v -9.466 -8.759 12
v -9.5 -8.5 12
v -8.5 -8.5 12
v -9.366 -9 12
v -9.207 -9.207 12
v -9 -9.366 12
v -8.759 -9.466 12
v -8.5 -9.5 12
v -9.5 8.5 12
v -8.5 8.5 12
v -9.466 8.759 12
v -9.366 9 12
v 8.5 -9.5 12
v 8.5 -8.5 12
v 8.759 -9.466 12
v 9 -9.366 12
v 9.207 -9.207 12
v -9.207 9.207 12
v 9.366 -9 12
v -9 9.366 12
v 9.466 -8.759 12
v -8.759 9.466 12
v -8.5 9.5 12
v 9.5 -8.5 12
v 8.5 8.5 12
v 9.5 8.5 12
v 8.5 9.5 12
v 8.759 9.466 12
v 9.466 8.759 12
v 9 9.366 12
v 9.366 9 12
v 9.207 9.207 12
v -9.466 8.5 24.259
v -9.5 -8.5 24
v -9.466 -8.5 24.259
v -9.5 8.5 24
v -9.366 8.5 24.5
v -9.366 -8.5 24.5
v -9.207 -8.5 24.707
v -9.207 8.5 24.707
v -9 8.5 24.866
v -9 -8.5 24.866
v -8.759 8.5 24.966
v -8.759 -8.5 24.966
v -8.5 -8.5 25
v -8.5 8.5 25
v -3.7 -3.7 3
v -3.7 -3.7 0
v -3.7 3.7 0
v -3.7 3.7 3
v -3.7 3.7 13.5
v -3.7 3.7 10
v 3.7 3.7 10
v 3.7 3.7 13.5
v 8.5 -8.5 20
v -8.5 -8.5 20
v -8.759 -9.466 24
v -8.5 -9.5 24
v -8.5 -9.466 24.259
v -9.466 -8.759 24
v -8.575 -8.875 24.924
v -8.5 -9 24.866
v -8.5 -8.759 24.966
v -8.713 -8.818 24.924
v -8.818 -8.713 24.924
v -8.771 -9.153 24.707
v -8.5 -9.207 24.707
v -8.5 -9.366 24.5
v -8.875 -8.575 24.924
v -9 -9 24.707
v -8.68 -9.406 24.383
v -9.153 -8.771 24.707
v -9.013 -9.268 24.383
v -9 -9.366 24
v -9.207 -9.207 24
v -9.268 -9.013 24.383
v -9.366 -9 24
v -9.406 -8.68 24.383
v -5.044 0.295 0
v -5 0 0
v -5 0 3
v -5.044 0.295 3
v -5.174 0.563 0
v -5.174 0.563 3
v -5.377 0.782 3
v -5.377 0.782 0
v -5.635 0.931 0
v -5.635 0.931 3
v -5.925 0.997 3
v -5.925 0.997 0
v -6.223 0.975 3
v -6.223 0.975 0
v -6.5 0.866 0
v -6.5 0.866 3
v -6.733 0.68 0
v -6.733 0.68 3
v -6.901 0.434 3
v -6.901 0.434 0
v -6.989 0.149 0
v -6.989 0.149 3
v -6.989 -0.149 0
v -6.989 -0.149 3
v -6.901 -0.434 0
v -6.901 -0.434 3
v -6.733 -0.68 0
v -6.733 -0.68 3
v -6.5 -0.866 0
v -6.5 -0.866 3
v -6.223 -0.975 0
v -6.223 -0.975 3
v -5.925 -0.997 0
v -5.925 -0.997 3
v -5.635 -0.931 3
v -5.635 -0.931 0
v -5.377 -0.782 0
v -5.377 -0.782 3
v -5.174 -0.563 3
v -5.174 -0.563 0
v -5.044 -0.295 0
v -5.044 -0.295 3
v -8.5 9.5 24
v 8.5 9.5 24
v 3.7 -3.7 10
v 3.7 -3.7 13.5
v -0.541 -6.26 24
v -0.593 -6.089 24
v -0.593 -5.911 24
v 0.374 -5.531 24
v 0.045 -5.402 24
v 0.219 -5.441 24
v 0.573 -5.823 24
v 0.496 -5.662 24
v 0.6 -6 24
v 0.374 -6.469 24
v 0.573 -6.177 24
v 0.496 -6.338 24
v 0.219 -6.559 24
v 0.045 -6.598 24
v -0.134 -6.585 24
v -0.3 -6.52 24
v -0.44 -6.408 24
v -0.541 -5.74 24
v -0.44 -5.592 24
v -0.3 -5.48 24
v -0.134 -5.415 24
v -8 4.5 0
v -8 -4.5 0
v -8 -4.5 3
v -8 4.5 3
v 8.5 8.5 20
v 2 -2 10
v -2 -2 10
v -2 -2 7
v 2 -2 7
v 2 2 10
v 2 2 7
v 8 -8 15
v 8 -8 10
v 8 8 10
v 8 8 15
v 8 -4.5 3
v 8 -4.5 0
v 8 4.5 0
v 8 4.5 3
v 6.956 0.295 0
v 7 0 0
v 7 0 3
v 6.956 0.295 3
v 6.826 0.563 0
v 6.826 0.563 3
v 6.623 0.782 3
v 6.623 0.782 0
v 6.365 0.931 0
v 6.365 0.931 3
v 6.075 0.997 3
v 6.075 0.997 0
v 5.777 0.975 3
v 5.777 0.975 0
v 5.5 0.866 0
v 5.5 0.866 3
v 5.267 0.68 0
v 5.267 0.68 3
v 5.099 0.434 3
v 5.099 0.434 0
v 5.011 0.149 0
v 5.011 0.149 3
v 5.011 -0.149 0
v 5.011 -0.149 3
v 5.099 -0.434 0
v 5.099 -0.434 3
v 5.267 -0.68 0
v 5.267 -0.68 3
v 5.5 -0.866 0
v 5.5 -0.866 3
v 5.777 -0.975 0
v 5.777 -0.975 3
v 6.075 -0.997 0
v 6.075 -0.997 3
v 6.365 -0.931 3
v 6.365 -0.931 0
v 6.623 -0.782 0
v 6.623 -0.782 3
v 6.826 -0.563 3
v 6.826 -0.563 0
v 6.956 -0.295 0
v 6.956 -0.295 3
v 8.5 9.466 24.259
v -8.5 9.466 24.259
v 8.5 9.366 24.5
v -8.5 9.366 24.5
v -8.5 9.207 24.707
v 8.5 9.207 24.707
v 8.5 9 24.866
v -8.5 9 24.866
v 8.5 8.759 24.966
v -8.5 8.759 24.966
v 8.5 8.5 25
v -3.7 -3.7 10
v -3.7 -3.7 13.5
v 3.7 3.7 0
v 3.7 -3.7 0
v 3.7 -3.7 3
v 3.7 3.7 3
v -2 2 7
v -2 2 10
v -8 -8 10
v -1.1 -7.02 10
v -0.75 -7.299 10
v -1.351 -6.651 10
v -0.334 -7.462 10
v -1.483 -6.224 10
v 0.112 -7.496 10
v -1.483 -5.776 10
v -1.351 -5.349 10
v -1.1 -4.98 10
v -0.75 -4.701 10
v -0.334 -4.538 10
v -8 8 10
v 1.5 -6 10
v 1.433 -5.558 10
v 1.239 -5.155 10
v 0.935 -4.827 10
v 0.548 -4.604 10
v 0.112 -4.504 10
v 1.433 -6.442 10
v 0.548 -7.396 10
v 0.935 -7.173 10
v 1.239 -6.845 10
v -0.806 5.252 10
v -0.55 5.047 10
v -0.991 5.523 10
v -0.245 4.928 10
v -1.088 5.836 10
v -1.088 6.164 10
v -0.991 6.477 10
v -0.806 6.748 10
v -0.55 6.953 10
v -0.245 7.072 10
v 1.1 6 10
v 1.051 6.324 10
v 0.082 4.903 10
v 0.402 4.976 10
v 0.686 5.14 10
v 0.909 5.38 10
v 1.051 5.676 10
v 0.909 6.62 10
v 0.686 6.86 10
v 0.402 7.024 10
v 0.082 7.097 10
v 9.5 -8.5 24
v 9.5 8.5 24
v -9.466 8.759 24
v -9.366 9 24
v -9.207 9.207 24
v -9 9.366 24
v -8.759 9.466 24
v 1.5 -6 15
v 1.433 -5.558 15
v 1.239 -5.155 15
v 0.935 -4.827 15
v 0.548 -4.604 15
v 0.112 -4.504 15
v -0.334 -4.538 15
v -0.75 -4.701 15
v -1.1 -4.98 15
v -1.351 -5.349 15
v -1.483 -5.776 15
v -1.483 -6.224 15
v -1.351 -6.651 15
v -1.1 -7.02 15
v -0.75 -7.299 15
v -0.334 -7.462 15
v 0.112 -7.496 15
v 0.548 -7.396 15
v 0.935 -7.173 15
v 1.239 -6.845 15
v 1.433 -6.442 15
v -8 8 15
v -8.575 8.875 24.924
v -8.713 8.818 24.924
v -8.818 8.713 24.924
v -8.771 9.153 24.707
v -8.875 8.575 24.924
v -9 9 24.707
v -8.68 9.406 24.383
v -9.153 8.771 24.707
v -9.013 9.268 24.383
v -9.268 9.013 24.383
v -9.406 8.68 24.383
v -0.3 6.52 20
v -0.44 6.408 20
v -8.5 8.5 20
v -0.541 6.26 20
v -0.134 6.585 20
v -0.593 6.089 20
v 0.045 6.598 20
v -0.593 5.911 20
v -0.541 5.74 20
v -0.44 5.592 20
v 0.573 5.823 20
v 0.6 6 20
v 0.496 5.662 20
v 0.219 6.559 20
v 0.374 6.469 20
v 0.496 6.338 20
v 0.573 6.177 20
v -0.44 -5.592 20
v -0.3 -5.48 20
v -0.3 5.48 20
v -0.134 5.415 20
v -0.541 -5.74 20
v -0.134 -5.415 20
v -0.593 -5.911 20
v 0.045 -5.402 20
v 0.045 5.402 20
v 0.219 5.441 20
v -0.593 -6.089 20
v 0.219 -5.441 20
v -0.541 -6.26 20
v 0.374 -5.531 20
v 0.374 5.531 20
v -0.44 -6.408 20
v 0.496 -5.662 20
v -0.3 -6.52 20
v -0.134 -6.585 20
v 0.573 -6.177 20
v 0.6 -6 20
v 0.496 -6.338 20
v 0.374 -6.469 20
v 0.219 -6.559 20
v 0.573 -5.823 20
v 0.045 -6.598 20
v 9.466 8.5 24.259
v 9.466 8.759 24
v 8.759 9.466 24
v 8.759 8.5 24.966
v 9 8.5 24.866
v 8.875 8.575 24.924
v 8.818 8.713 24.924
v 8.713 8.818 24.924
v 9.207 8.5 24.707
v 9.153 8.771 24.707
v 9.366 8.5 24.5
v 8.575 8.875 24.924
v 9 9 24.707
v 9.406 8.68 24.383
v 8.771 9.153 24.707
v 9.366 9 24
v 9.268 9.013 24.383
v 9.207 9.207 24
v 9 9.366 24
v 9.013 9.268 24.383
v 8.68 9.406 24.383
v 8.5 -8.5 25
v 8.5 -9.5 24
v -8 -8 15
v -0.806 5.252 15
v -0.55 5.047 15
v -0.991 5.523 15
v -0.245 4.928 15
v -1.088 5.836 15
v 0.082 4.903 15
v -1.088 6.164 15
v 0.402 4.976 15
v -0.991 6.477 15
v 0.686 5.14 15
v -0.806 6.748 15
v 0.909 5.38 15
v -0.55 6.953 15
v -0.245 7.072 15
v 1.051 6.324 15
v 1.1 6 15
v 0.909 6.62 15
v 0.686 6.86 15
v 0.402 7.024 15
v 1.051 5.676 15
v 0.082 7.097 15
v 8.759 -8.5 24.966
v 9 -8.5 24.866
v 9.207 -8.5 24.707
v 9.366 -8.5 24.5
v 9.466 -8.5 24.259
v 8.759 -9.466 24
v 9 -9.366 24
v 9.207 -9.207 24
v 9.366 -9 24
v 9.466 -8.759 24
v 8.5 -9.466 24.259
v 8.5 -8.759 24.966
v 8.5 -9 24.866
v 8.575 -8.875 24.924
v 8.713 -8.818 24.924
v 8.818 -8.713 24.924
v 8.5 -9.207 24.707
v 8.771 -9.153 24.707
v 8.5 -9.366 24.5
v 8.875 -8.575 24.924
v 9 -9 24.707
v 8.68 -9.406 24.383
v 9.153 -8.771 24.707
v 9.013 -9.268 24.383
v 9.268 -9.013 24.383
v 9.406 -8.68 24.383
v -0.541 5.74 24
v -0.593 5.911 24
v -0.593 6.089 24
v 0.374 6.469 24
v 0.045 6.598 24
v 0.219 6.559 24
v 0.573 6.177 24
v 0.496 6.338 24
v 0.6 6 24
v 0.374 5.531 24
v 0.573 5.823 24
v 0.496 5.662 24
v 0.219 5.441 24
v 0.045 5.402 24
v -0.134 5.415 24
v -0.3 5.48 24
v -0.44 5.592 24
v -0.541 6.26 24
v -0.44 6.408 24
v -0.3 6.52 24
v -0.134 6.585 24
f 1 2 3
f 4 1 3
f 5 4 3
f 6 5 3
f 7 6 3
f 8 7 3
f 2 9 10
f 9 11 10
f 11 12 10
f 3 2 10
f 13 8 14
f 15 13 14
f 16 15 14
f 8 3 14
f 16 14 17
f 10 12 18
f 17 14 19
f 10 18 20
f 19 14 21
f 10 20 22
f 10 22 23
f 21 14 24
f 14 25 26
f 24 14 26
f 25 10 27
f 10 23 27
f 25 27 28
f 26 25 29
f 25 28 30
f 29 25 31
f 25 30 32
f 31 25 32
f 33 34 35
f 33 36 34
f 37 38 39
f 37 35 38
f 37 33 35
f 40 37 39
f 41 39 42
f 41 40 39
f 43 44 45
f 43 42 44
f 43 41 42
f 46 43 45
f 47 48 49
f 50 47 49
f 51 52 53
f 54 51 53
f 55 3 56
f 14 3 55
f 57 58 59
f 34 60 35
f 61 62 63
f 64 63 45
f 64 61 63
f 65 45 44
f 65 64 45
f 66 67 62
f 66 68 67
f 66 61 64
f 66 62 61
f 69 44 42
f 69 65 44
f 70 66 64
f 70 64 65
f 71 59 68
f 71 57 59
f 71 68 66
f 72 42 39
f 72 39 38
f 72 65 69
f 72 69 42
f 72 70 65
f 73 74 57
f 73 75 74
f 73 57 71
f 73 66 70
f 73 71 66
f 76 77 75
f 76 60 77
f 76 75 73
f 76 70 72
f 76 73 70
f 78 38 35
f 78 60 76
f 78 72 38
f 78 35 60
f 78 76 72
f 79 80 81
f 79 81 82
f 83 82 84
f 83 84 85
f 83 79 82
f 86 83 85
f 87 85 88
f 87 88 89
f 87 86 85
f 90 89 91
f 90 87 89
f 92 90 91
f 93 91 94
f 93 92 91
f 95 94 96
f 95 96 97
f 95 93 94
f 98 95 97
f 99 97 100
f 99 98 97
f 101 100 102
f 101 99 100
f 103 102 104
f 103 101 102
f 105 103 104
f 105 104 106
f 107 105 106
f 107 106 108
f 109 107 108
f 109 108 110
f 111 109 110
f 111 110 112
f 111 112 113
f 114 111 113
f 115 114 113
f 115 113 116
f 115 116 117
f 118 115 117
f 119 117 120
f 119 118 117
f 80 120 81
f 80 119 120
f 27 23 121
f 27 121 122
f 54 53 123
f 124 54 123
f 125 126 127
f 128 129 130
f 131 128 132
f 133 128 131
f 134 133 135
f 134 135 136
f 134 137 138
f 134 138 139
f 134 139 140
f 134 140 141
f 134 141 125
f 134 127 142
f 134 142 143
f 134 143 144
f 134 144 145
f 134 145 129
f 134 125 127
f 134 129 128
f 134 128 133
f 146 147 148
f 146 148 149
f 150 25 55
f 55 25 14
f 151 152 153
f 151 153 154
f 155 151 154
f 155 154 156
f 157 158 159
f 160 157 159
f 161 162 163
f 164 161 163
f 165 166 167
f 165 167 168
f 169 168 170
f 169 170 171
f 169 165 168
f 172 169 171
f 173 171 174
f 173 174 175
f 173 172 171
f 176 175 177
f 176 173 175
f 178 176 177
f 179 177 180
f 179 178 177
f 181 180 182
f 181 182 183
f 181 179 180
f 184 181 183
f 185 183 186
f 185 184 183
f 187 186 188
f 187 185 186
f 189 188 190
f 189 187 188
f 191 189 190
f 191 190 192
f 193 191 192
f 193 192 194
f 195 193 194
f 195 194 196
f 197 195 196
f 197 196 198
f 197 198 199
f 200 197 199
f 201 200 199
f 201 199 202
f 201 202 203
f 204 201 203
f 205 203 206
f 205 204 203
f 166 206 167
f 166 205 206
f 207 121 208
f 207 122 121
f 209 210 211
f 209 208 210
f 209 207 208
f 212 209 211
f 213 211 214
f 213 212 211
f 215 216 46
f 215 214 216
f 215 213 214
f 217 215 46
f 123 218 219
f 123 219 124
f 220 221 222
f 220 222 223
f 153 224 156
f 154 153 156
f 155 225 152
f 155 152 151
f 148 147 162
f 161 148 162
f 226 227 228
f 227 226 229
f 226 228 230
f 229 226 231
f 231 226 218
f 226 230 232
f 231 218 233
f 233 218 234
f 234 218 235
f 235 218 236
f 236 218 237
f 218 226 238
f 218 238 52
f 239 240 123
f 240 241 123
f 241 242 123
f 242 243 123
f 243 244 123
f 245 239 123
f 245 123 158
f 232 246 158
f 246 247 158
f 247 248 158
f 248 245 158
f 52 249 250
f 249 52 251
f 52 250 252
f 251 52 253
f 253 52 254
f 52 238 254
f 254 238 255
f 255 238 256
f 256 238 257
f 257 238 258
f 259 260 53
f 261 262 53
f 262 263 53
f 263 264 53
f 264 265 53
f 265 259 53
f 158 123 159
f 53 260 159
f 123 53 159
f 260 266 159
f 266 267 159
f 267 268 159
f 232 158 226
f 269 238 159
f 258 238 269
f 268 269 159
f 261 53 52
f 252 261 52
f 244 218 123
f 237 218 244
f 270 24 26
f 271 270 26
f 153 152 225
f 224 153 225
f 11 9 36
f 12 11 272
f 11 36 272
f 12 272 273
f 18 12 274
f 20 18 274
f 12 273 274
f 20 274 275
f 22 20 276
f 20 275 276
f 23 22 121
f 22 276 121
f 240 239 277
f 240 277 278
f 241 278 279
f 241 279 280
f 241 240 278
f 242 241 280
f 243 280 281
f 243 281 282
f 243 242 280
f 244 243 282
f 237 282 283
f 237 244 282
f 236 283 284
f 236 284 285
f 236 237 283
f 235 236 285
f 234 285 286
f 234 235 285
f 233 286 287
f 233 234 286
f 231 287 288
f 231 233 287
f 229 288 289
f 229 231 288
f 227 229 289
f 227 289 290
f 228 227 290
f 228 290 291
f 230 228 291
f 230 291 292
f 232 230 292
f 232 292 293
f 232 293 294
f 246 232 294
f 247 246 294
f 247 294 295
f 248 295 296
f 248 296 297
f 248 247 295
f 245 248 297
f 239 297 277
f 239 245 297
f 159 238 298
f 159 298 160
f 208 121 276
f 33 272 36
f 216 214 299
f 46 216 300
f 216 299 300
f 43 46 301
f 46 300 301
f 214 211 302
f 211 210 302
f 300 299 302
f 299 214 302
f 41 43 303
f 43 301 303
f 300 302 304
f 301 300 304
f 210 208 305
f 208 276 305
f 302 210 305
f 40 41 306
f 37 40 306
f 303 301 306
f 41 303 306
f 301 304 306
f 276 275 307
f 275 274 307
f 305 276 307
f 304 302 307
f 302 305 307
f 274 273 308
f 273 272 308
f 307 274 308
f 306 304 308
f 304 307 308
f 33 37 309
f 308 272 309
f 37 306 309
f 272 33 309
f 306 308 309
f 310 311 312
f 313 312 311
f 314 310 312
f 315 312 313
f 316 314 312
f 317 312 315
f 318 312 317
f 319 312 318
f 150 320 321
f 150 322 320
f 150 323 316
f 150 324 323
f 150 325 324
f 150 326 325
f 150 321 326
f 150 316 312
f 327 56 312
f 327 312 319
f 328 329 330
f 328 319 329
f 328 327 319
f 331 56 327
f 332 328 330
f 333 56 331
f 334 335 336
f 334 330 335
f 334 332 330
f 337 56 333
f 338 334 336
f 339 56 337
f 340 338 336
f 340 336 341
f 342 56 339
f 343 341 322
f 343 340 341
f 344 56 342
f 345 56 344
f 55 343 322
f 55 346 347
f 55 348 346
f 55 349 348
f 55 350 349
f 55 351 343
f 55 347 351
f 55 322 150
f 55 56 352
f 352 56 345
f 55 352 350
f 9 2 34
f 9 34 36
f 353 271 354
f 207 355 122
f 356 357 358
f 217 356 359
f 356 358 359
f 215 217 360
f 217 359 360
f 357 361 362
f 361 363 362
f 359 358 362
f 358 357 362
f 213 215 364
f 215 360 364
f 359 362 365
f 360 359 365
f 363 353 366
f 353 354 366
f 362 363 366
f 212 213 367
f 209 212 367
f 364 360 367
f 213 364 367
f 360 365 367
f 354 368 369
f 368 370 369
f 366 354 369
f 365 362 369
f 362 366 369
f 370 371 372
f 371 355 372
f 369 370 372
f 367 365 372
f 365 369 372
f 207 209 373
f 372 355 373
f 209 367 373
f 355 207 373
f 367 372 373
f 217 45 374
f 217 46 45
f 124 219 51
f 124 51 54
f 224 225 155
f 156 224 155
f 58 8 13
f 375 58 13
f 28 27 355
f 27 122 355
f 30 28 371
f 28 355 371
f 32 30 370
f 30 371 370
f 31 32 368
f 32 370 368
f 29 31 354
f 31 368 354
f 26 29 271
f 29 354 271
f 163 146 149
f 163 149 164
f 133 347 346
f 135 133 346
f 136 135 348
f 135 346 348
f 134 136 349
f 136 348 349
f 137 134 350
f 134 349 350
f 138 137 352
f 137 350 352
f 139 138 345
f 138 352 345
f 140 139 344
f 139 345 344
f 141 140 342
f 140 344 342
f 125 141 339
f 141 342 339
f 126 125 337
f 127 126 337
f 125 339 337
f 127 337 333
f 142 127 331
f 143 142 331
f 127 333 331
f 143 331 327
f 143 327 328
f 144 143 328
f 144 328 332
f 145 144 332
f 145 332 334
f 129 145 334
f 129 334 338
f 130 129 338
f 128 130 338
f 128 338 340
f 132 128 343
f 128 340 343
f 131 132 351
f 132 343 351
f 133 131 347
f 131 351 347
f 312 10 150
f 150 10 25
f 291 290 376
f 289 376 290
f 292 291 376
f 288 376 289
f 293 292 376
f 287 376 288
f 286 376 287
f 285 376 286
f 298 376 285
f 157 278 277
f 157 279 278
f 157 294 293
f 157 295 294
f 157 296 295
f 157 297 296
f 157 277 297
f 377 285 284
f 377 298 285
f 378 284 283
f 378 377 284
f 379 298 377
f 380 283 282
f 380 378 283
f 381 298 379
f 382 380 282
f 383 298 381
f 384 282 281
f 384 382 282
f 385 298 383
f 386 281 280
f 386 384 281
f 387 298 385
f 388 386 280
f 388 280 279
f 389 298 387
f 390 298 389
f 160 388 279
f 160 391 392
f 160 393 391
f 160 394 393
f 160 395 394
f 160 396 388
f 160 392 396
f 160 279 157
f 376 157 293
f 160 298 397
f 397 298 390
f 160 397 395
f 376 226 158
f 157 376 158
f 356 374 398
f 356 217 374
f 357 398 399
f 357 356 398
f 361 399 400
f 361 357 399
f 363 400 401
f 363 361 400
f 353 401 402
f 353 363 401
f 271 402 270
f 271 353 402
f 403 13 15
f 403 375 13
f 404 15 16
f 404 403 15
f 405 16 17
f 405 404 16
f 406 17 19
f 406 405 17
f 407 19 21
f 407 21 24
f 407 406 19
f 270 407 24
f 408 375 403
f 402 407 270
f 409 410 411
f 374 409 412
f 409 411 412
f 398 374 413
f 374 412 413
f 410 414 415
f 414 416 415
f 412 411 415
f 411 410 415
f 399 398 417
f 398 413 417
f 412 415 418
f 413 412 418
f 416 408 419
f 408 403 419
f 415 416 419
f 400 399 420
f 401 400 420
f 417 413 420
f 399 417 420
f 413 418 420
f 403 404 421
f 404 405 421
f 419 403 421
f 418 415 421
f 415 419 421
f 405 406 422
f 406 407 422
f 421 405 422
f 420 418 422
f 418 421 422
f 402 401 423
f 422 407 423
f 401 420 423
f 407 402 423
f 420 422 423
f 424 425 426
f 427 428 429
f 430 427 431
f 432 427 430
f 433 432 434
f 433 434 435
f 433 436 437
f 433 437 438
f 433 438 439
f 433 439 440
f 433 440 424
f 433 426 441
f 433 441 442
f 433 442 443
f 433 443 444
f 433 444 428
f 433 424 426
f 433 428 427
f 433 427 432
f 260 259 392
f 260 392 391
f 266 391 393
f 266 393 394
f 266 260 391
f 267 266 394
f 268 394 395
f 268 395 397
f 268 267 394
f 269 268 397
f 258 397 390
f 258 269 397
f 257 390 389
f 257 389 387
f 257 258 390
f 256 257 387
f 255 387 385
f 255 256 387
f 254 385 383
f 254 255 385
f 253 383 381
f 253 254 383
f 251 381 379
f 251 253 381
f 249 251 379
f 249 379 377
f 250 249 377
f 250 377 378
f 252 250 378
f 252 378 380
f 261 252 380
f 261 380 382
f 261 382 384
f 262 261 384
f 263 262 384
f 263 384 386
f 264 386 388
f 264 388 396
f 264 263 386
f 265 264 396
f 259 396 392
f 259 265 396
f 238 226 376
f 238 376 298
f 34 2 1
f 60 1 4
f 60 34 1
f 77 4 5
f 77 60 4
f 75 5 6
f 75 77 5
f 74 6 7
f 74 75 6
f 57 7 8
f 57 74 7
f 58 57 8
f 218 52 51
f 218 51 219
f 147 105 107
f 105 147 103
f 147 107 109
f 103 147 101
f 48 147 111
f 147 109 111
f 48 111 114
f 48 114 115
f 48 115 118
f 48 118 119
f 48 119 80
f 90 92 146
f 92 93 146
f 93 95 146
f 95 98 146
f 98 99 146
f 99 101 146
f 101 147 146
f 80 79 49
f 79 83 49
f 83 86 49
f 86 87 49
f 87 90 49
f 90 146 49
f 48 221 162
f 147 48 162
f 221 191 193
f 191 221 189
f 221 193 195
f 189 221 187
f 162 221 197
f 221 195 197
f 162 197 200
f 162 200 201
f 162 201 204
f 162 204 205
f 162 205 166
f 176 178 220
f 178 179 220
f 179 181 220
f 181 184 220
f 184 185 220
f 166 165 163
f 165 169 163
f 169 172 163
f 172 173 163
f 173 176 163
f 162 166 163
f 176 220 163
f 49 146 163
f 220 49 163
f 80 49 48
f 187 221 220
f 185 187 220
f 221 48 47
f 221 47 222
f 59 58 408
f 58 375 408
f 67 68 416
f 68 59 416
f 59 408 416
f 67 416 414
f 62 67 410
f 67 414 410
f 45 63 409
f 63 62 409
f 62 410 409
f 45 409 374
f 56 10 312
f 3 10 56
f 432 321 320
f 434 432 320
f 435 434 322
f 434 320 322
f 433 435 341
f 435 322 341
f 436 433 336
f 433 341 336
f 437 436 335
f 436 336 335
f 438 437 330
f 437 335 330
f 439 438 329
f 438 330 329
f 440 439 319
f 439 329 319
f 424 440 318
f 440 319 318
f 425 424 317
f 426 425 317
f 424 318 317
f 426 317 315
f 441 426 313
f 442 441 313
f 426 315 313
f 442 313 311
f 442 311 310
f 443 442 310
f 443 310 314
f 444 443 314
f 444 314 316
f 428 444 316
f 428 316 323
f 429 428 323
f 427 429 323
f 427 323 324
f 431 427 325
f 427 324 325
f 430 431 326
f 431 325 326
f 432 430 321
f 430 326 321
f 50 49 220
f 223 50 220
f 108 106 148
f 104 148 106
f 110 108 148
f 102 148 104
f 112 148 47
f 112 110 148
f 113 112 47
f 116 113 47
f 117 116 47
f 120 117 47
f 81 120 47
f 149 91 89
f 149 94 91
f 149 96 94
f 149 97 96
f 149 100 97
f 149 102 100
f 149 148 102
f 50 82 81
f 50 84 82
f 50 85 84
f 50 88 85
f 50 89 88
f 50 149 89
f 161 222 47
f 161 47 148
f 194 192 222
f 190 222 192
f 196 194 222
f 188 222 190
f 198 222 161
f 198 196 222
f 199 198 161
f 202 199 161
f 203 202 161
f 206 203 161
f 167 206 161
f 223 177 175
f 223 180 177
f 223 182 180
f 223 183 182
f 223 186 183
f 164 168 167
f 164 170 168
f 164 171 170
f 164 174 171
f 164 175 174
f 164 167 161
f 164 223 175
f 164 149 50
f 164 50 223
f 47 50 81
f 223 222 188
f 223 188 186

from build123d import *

# Parameters (mm, degrees)
F0_W      = 16
F0_H      = 9
F0_R      = 1
F0_W_2    = 7.4
F0_H_2    = 7.4
F1_DEPTH  = 3
F3_W      = 4
F3_H      = 4
F4_DEPTH  = 3
F5_W      = 16
F5_H      = 16
F5_R      = 1.5
F5_R_2    = 1.1
F6_DEPTH  = 5
F8_W      = 19
F8_H      = 19
F9_DEPTH  = 13
F10_W     = 17
F10_H     = 17
F11_DEPTH = 8
F12_R     = 0.6
F13_DEPTH = 4
F14_R     = 1
F15_W     = 7.4
F15_H     = 7.4
F16_DEPTH = 3.5


with BuildPart() as f1:
    # F0 (on Top) → F1 (new body)
    with BuildSketch(Plane.XY):
        Rectangle(F0_W, F0_H)
        with Locations((-6, 0)):
            Circle(F0_R, mode=Mode.SUBTRACT)
        Rectangle(F0_W_2, F0_H_2, mode=Mode.SUBTRACT)
        with Locations((6, 0)):
            Circle(F0_R, mode=Mode.SUBTRACT)
    extrude(amount=F1_DEPTH)


with BuildPart() as f4:
    # F3 (on offset) → F4 (new body)
    with BuildSketch(Plane.XY.offset(10)):
        Rectangle(F3_W, F3_H)
    extrude(amount=-F4_DEPTH)


with BuildPart() as f6:
    # F5 (on offset) → F6 (new body)
    with BuildSketch(Plane.XY.offset(10)):
        Rectangle(F5_W, F5_H)
        with Locations((0, -6)):
            Circle(F5_R, mode=Mode.SUBTRACT)
        with Locations((0, 6)):
            Circle(F5_R_2, mode=Mode.SUBTRACT)
    extrude(amount=F6_DEPTH)

    # F15 (on face) → F16 (cut)
    with BuildSketch(Plane(origin=(0, 0, 10), x_dir=(1, 0, 0), z_dir=(0, 0, -1))):
        Rectangle(F15_W, F15_H)
    extrude(amount=-F16_DEPTH, mode=Mode.SUBTRACT)


with BuildPart() as f9:
    # F8 (on offset) → F9 (new body)
    with BuildSketch(Plane.XY.offset(12)):
        Rectangle(F8_W, F8_H)
    extrude(amount=F9_DEPTH)

    # F10 (on face) → F11 (cut)
    with BuildSketch(Plane(origin=(0, 0, 12), x_dir=(1, 0, 0), z_dir=(0, 0, -1))):
        Rectangle(F10_W, F10_H)
    extrude(amount=-F11_DEPTH, mode=Mode.SUBTRACT)

    # F12 (on face) → F13 (cut)
    with BuildSketch(Plane(origin=(0, 0, 20), x_dir=(1, 0, 0), z_dir=(0, 0, -1))):
        with Locations((0, 6)):
            Circle(F12_R)
        with Locations((0, -6)):
            Circle(F12_R)
    extrude(amount=-F13_DEPTH, mode=Mode.SUBTRACT)

    # F14
    f14_edges = [f9.edges().sort_by_distance(p)[0] for p in [
        (-9.5, -9.5, 18.5),
        (9.5, -9.5, 18.5),
        (-9.5, 9.5, 18.5),
        (9.5, 9.5, 18.5),
        (0, -9.5, 25),
        (9.5, 0, 25),
        (0, 9.5, 25),
        (-9.5, 0, 25),
    ]]
    fillet(f14_edges, radius=F14_R)


solid = Compound([f1.part, f4.part, f6.part, f9.part])
